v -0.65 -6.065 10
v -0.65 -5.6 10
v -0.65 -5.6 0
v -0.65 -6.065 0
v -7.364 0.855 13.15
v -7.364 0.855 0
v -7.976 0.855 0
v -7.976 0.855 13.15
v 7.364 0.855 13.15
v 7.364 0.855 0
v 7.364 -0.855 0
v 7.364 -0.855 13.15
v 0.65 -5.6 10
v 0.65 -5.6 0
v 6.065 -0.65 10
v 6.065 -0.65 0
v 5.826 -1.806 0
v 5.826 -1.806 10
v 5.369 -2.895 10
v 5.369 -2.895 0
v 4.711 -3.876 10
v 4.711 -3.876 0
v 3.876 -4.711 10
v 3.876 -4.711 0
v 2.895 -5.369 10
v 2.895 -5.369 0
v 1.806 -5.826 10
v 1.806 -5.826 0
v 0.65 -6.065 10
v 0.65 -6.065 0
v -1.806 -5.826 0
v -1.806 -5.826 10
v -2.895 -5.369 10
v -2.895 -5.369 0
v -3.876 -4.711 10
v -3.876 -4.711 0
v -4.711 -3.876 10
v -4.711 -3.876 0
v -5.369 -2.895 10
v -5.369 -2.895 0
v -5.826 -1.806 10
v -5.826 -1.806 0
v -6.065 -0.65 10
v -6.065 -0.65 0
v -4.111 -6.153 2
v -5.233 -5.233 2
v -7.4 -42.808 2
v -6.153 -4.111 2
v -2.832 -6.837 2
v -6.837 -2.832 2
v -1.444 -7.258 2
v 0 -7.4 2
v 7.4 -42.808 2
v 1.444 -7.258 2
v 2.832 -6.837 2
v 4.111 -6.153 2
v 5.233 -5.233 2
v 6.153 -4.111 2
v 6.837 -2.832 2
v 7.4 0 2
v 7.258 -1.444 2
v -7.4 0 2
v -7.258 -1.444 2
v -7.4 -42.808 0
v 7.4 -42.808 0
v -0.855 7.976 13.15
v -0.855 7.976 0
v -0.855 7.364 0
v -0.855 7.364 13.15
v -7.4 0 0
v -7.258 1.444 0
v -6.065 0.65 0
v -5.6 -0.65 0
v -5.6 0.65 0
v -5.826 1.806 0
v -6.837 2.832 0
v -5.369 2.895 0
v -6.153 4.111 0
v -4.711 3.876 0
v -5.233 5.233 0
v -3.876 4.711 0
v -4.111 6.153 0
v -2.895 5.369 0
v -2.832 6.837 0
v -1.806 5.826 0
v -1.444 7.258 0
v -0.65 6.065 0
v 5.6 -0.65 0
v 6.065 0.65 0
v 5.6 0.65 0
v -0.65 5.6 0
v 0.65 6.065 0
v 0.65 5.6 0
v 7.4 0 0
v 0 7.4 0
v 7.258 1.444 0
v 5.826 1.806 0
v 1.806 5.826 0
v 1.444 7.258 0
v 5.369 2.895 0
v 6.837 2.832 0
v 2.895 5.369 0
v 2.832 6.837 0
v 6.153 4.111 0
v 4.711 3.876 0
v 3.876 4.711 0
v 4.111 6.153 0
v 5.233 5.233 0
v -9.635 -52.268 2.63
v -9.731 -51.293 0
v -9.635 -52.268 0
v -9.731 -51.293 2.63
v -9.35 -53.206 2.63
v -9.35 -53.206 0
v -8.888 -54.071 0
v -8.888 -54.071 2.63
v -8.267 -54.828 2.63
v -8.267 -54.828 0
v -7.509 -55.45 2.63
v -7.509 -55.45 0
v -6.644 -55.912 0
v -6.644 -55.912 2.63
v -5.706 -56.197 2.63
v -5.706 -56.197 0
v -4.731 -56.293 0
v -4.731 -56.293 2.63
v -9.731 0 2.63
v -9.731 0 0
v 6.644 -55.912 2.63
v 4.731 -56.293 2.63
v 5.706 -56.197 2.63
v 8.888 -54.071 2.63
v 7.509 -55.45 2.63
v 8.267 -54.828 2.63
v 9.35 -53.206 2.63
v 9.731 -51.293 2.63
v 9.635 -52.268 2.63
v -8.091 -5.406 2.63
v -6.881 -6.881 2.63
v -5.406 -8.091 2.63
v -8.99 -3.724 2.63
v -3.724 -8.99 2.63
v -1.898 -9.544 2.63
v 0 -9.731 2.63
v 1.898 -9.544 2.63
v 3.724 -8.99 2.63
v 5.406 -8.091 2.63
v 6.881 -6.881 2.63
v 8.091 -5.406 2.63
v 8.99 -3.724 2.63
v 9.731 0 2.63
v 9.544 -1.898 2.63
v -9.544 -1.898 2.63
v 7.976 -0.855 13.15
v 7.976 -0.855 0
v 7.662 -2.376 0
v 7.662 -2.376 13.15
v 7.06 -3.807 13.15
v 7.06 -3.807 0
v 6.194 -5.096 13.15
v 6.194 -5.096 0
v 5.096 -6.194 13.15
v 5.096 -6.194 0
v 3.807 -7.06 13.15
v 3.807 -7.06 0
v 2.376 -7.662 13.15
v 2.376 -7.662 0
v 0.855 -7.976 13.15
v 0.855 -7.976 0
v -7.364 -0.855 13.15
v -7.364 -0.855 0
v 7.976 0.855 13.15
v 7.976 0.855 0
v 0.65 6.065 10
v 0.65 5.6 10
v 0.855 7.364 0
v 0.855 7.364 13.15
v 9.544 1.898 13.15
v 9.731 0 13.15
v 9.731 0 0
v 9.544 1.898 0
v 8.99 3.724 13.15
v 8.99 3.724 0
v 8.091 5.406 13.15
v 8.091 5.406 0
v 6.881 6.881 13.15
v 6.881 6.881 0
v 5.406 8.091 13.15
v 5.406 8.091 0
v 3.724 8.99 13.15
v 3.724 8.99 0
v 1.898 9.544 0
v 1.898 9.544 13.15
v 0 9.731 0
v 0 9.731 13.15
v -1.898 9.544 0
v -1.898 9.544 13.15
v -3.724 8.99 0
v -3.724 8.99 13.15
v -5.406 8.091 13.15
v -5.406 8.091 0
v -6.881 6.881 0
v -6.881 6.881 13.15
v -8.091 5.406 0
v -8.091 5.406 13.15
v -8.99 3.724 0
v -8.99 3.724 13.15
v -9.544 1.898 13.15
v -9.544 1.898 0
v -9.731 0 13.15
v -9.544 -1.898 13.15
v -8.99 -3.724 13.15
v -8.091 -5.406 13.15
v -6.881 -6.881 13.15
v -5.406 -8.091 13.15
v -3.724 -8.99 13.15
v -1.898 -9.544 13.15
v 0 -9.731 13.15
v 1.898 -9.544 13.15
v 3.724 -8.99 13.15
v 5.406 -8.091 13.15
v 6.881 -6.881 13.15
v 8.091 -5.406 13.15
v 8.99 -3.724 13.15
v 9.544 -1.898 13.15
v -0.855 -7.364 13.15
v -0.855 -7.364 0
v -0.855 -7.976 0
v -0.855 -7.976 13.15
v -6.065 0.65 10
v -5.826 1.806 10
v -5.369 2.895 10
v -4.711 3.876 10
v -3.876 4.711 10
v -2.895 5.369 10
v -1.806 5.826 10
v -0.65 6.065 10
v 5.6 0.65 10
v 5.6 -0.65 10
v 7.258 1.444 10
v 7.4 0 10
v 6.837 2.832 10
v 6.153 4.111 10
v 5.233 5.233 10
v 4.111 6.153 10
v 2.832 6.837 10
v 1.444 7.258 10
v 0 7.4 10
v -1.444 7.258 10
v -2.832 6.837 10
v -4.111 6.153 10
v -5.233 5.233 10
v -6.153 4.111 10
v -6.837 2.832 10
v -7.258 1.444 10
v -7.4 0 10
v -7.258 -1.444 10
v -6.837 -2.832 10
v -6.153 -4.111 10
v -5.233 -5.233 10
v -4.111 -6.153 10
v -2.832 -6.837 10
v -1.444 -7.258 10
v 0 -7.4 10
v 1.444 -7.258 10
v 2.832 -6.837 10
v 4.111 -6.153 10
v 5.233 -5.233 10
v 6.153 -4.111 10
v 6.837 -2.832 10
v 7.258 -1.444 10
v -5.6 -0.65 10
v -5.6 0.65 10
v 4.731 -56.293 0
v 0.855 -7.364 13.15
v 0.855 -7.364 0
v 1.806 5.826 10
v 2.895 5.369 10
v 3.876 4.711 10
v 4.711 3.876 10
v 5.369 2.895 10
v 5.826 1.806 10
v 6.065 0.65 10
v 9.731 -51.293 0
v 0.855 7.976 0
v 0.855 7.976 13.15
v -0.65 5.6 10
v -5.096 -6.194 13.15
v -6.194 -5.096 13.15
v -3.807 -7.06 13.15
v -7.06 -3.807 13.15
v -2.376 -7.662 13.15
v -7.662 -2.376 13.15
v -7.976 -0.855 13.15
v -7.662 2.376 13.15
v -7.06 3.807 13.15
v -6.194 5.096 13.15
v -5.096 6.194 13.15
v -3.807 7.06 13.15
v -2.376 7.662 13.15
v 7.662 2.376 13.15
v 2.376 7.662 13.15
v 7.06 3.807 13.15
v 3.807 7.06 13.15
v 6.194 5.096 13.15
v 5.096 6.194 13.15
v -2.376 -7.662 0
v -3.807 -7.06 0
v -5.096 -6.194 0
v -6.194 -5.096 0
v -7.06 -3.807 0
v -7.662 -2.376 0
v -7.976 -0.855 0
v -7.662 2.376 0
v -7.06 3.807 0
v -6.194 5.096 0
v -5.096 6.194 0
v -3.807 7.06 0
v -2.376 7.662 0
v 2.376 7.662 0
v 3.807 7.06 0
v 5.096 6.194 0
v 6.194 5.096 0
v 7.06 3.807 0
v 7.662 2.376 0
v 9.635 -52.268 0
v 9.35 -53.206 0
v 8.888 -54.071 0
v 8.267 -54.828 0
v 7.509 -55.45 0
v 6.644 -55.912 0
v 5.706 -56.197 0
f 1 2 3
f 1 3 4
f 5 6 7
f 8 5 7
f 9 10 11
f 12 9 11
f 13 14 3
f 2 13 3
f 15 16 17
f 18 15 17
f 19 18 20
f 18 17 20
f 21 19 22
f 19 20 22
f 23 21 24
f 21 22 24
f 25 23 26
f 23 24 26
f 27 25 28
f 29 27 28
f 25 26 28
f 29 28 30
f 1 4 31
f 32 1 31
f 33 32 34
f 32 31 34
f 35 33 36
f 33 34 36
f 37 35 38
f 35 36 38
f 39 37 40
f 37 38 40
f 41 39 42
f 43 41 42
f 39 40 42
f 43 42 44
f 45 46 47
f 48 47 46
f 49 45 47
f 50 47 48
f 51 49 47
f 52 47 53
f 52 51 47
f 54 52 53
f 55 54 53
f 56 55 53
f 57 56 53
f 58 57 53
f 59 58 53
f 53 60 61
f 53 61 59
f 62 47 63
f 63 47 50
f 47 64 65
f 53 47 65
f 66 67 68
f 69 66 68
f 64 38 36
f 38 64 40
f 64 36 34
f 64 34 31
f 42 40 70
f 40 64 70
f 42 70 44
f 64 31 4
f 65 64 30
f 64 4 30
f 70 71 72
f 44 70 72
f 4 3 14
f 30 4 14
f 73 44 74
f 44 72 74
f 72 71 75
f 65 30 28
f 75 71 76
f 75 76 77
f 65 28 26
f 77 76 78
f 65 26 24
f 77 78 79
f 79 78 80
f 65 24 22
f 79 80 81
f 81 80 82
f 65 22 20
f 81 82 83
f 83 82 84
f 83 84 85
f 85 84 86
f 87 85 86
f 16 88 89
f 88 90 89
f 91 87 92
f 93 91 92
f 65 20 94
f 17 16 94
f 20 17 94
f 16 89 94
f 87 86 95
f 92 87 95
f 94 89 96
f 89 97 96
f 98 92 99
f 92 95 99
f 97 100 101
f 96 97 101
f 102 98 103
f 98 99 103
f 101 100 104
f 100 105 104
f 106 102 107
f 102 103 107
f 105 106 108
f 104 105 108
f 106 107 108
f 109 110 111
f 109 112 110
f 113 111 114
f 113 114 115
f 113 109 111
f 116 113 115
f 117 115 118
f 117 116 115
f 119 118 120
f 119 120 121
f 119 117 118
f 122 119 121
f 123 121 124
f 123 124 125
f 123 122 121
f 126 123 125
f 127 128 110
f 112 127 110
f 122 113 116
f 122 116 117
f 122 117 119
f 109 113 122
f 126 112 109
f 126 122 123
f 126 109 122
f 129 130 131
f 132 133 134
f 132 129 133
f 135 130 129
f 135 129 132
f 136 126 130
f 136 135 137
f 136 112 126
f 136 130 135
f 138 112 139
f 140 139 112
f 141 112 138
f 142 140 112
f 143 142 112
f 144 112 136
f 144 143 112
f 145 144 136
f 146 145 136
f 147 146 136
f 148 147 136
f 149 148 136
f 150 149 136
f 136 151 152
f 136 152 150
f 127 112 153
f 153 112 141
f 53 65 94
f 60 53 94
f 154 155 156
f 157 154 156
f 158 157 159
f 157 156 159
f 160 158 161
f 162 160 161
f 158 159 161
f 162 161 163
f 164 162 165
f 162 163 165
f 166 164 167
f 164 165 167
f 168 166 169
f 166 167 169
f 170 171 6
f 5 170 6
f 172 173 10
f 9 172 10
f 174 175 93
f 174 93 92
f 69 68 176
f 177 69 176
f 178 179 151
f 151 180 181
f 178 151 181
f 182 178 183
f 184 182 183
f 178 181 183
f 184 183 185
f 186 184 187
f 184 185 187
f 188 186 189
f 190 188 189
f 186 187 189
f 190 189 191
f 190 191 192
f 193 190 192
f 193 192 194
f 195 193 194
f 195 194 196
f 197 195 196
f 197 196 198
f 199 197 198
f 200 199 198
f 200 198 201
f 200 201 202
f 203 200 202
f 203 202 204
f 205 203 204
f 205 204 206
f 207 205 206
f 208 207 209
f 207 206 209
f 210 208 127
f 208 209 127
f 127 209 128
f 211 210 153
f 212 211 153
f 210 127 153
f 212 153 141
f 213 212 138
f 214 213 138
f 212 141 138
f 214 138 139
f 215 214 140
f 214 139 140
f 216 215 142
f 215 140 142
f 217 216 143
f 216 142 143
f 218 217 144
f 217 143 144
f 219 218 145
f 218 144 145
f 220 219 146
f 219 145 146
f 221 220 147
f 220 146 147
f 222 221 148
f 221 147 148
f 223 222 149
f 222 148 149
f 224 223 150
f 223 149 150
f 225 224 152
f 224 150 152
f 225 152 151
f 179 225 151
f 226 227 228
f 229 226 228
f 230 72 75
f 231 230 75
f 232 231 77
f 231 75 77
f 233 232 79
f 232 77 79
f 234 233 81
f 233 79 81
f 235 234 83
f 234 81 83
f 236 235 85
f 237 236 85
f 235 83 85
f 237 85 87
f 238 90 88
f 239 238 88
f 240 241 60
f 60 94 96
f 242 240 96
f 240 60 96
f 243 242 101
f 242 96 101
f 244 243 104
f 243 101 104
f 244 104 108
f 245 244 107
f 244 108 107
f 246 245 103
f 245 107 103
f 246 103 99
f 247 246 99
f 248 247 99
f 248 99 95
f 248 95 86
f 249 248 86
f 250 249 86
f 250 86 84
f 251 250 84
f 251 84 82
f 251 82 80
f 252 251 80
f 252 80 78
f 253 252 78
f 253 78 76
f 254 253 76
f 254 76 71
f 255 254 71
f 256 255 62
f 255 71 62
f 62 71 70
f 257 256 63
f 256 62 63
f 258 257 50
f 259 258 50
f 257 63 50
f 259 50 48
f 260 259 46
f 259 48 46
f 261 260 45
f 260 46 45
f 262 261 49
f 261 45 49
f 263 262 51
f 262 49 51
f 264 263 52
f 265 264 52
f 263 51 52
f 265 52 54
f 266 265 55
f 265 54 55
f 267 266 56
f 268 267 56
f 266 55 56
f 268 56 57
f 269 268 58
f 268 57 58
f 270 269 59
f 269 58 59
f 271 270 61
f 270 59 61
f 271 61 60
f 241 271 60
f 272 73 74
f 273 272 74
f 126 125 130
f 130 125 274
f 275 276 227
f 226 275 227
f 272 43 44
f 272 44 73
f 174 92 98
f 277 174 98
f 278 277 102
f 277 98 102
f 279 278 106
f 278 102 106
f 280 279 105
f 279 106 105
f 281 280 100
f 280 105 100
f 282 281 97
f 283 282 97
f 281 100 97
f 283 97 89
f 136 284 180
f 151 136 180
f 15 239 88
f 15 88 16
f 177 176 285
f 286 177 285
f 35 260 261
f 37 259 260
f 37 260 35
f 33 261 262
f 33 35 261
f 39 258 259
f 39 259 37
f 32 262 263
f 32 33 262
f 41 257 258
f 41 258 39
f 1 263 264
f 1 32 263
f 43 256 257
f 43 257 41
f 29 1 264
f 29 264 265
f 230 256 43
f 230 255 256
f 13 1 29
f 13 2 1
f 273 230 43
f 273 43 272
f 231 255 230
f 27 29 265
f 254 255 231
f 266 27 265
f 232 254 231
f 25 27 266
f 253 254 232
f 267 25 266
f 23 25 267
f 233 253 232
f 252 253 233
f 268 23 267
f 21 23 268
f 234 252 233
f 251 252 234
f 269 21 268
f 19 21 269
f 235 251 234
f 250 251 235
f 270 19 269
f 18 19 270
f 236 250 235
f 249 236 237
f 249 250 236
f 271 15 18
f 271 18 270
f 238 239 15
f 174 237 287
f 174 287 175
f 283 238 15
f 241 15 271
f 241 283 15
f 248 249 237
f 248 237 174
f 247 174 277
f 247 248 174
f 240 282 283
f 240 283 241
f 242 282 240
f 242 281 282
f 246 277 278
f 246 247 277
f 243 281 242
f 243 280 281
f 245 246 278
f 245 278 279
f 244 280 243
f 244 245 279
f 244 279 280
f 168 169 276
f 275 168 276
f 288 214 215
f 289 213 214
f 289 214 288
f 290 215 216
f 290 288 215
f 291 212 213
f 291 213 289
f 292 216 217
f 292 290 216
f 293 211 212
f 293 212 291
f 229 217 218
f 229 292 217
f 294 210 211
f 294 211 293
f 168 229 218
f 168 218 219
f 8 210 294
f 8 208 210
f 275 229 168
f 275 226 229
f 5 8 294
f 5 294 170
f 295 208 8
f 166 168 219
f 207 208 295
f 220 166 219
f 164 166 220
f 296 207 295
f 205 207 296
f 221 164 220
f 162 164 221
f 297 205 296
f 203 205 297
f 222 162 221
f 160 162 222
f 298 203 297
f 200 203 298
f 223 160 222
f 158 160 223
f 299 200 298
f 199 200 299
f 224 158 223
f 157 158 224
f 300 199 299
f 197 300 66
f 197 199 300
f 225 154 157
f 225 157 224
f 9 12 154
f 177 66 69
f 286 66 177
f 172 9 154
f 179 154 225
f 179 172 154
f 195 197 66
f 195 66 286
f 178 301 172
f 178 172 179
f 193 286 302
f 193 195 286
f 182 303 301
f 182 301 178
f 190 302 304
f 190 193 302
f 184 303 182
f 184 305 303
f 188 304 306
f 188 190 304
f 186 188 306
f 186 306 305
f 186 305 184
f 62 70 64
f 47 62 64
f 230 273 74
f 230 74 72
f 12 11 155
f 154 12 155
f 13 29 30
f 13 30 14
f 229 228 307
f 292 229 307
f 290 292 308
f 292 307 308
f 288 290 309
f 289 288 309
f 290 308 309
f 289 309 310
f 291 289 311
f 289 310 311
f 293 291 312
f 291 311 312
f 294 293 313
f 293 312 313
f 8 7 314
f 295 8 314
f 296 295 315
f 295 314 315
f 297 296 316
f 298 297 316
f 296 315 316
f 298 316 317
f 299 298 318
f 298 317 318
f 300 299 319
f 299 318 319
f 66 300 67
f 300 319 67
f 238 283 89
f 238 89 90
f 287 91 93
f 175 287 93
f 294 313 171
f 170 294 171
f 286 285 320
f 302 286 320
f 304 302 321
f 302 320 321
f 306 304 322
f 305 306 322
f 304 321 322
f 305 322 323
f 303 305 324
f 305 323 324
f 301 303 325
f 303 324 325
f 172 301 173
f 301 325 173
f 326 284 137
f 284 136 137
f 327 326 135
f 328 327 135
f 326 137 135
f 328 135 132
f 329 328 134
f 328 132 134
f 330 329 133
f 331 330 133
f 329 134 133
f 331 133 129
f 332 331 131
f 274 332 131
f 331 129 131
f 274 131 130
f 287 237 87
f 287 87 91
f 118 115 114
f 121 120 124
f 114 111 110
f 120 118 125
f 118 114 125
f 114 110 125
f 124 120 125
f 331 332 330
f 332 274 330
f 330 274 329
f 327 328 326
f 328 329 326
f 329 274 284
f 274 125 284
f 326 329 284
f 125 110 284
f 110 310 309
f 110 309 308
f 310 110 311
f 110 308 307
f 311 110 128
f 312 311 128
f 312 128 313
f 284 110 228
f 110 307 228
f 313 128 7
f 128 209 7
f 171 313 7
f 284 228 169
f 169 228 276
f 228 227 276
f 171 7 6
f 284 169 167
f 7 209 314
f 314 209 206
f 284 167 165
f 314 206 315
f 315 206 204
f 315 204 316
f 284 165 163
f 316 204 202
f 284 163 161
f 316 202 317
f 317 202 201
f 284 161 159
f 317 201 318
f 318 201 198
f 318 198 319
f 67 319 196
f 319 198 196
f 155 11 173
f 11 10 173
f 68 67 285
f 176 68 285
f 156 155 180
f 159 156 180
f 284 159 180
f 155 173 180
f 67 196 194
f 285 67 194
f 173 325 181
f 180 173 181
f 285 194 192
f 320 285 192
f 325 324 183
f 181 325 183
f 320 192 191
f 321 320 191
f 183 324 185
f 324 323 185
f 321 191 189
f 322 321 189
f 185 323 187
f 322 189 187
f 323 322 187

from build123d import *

# Parameters (mm, degrees)
F1_DEPTH = 2
F2_DEPTH = 10
F3_SCALE = 1.315
F4_R     = 5


with BuildPart() as f1:
    # F0 (on Top) → F1 (new body)
    with BuildSketch(Plane.XY):
        with BuildLine():
            Line((7.4, -42.808201164), (7.4, 0))
            ThreePointArc((7.4, 0), (0, -7.4), (-7.4, 0))
            Line((-7.4, 0), (-7.4, -42.808201164))
            Line((-7.4, -42.808201164), (7.4, -42.808201164))
        make_face()
    extrude(amount=F1_DEPTH)

    # F0 (on Top) → F2 (join)
    with BuildSketch(Plane.XY):
        with BuildLine():
            ThreePointArc((-7.4, 0), (0, -7.4), (7.4, 0))
            ThreePointArc((7.4, 0), (0, 7.4), (-7.4, 0))
        make_face()
        with BuildLine():
            ThreePointArc((6.0652699857, -0.65), (4.3133513652, -4.3133513652), (0.65, -6.0652699857))
            Line((0.65, -6.0652699857), (0.65, -5.6))
            Line((0.65, -5.6), (-0.65, -5.6))
            Line((-0.65, -5.6), (-0.65, -6.0652699857))
            ThreePointArc((-0.65, -6.0652699857), (-4.3133513652, -4.3133513652), (-6.0652699857, -0.65))
            Line((-6.0652699857, -0.65), (-5.6, -0.65))
            Line((-5.6, -0.65), (-5.6, 0.65))
            Line((-5.6, 0.65), (-6.0652699857, 0.65))
            ThreePointArc((-6.0652699857, 0.65), (-4.3133513652, 4.3133513652), (-0.65, 6.0652699857))
            Line((-0.65, 6.0652699857), (-0.65, 5.6))
            Line((-0.65, 5.6), (0.65, 5.6))
            Line((0.65, 5.6), (0.65, 6.0652699857))
            ThreePointArc((0.65, 6.0652699857), (4.3133513652, 4.3133513652), (6.0652699857, 0.65))
            Line((6.0652699857, 0.65), (5.6, 0.65))
            Line((5.6, 0.65), (5.6, -0.65))
            Line((5.6, -0.65), (6.0652699857, -0.65))
        make_face(mode=Mode.SUBTRACT)
    extrude(amount=F2_DEPTH)


with BuildPart() as f3_1:
    # F3: copy of F1
    add(f1.part.scale(F3_SCALE))

    # F4
    f4_edges = [f3_1.edges().sort_by_distance(p)[0] for p in [
        (-9.731, -56.292785, 1.315),
        (9.731, -56.292785, 1.315),
    ]]
    fillet(f4_edges, radius=F4_R)


solid = Compound([f1.part, f3_1.part])
